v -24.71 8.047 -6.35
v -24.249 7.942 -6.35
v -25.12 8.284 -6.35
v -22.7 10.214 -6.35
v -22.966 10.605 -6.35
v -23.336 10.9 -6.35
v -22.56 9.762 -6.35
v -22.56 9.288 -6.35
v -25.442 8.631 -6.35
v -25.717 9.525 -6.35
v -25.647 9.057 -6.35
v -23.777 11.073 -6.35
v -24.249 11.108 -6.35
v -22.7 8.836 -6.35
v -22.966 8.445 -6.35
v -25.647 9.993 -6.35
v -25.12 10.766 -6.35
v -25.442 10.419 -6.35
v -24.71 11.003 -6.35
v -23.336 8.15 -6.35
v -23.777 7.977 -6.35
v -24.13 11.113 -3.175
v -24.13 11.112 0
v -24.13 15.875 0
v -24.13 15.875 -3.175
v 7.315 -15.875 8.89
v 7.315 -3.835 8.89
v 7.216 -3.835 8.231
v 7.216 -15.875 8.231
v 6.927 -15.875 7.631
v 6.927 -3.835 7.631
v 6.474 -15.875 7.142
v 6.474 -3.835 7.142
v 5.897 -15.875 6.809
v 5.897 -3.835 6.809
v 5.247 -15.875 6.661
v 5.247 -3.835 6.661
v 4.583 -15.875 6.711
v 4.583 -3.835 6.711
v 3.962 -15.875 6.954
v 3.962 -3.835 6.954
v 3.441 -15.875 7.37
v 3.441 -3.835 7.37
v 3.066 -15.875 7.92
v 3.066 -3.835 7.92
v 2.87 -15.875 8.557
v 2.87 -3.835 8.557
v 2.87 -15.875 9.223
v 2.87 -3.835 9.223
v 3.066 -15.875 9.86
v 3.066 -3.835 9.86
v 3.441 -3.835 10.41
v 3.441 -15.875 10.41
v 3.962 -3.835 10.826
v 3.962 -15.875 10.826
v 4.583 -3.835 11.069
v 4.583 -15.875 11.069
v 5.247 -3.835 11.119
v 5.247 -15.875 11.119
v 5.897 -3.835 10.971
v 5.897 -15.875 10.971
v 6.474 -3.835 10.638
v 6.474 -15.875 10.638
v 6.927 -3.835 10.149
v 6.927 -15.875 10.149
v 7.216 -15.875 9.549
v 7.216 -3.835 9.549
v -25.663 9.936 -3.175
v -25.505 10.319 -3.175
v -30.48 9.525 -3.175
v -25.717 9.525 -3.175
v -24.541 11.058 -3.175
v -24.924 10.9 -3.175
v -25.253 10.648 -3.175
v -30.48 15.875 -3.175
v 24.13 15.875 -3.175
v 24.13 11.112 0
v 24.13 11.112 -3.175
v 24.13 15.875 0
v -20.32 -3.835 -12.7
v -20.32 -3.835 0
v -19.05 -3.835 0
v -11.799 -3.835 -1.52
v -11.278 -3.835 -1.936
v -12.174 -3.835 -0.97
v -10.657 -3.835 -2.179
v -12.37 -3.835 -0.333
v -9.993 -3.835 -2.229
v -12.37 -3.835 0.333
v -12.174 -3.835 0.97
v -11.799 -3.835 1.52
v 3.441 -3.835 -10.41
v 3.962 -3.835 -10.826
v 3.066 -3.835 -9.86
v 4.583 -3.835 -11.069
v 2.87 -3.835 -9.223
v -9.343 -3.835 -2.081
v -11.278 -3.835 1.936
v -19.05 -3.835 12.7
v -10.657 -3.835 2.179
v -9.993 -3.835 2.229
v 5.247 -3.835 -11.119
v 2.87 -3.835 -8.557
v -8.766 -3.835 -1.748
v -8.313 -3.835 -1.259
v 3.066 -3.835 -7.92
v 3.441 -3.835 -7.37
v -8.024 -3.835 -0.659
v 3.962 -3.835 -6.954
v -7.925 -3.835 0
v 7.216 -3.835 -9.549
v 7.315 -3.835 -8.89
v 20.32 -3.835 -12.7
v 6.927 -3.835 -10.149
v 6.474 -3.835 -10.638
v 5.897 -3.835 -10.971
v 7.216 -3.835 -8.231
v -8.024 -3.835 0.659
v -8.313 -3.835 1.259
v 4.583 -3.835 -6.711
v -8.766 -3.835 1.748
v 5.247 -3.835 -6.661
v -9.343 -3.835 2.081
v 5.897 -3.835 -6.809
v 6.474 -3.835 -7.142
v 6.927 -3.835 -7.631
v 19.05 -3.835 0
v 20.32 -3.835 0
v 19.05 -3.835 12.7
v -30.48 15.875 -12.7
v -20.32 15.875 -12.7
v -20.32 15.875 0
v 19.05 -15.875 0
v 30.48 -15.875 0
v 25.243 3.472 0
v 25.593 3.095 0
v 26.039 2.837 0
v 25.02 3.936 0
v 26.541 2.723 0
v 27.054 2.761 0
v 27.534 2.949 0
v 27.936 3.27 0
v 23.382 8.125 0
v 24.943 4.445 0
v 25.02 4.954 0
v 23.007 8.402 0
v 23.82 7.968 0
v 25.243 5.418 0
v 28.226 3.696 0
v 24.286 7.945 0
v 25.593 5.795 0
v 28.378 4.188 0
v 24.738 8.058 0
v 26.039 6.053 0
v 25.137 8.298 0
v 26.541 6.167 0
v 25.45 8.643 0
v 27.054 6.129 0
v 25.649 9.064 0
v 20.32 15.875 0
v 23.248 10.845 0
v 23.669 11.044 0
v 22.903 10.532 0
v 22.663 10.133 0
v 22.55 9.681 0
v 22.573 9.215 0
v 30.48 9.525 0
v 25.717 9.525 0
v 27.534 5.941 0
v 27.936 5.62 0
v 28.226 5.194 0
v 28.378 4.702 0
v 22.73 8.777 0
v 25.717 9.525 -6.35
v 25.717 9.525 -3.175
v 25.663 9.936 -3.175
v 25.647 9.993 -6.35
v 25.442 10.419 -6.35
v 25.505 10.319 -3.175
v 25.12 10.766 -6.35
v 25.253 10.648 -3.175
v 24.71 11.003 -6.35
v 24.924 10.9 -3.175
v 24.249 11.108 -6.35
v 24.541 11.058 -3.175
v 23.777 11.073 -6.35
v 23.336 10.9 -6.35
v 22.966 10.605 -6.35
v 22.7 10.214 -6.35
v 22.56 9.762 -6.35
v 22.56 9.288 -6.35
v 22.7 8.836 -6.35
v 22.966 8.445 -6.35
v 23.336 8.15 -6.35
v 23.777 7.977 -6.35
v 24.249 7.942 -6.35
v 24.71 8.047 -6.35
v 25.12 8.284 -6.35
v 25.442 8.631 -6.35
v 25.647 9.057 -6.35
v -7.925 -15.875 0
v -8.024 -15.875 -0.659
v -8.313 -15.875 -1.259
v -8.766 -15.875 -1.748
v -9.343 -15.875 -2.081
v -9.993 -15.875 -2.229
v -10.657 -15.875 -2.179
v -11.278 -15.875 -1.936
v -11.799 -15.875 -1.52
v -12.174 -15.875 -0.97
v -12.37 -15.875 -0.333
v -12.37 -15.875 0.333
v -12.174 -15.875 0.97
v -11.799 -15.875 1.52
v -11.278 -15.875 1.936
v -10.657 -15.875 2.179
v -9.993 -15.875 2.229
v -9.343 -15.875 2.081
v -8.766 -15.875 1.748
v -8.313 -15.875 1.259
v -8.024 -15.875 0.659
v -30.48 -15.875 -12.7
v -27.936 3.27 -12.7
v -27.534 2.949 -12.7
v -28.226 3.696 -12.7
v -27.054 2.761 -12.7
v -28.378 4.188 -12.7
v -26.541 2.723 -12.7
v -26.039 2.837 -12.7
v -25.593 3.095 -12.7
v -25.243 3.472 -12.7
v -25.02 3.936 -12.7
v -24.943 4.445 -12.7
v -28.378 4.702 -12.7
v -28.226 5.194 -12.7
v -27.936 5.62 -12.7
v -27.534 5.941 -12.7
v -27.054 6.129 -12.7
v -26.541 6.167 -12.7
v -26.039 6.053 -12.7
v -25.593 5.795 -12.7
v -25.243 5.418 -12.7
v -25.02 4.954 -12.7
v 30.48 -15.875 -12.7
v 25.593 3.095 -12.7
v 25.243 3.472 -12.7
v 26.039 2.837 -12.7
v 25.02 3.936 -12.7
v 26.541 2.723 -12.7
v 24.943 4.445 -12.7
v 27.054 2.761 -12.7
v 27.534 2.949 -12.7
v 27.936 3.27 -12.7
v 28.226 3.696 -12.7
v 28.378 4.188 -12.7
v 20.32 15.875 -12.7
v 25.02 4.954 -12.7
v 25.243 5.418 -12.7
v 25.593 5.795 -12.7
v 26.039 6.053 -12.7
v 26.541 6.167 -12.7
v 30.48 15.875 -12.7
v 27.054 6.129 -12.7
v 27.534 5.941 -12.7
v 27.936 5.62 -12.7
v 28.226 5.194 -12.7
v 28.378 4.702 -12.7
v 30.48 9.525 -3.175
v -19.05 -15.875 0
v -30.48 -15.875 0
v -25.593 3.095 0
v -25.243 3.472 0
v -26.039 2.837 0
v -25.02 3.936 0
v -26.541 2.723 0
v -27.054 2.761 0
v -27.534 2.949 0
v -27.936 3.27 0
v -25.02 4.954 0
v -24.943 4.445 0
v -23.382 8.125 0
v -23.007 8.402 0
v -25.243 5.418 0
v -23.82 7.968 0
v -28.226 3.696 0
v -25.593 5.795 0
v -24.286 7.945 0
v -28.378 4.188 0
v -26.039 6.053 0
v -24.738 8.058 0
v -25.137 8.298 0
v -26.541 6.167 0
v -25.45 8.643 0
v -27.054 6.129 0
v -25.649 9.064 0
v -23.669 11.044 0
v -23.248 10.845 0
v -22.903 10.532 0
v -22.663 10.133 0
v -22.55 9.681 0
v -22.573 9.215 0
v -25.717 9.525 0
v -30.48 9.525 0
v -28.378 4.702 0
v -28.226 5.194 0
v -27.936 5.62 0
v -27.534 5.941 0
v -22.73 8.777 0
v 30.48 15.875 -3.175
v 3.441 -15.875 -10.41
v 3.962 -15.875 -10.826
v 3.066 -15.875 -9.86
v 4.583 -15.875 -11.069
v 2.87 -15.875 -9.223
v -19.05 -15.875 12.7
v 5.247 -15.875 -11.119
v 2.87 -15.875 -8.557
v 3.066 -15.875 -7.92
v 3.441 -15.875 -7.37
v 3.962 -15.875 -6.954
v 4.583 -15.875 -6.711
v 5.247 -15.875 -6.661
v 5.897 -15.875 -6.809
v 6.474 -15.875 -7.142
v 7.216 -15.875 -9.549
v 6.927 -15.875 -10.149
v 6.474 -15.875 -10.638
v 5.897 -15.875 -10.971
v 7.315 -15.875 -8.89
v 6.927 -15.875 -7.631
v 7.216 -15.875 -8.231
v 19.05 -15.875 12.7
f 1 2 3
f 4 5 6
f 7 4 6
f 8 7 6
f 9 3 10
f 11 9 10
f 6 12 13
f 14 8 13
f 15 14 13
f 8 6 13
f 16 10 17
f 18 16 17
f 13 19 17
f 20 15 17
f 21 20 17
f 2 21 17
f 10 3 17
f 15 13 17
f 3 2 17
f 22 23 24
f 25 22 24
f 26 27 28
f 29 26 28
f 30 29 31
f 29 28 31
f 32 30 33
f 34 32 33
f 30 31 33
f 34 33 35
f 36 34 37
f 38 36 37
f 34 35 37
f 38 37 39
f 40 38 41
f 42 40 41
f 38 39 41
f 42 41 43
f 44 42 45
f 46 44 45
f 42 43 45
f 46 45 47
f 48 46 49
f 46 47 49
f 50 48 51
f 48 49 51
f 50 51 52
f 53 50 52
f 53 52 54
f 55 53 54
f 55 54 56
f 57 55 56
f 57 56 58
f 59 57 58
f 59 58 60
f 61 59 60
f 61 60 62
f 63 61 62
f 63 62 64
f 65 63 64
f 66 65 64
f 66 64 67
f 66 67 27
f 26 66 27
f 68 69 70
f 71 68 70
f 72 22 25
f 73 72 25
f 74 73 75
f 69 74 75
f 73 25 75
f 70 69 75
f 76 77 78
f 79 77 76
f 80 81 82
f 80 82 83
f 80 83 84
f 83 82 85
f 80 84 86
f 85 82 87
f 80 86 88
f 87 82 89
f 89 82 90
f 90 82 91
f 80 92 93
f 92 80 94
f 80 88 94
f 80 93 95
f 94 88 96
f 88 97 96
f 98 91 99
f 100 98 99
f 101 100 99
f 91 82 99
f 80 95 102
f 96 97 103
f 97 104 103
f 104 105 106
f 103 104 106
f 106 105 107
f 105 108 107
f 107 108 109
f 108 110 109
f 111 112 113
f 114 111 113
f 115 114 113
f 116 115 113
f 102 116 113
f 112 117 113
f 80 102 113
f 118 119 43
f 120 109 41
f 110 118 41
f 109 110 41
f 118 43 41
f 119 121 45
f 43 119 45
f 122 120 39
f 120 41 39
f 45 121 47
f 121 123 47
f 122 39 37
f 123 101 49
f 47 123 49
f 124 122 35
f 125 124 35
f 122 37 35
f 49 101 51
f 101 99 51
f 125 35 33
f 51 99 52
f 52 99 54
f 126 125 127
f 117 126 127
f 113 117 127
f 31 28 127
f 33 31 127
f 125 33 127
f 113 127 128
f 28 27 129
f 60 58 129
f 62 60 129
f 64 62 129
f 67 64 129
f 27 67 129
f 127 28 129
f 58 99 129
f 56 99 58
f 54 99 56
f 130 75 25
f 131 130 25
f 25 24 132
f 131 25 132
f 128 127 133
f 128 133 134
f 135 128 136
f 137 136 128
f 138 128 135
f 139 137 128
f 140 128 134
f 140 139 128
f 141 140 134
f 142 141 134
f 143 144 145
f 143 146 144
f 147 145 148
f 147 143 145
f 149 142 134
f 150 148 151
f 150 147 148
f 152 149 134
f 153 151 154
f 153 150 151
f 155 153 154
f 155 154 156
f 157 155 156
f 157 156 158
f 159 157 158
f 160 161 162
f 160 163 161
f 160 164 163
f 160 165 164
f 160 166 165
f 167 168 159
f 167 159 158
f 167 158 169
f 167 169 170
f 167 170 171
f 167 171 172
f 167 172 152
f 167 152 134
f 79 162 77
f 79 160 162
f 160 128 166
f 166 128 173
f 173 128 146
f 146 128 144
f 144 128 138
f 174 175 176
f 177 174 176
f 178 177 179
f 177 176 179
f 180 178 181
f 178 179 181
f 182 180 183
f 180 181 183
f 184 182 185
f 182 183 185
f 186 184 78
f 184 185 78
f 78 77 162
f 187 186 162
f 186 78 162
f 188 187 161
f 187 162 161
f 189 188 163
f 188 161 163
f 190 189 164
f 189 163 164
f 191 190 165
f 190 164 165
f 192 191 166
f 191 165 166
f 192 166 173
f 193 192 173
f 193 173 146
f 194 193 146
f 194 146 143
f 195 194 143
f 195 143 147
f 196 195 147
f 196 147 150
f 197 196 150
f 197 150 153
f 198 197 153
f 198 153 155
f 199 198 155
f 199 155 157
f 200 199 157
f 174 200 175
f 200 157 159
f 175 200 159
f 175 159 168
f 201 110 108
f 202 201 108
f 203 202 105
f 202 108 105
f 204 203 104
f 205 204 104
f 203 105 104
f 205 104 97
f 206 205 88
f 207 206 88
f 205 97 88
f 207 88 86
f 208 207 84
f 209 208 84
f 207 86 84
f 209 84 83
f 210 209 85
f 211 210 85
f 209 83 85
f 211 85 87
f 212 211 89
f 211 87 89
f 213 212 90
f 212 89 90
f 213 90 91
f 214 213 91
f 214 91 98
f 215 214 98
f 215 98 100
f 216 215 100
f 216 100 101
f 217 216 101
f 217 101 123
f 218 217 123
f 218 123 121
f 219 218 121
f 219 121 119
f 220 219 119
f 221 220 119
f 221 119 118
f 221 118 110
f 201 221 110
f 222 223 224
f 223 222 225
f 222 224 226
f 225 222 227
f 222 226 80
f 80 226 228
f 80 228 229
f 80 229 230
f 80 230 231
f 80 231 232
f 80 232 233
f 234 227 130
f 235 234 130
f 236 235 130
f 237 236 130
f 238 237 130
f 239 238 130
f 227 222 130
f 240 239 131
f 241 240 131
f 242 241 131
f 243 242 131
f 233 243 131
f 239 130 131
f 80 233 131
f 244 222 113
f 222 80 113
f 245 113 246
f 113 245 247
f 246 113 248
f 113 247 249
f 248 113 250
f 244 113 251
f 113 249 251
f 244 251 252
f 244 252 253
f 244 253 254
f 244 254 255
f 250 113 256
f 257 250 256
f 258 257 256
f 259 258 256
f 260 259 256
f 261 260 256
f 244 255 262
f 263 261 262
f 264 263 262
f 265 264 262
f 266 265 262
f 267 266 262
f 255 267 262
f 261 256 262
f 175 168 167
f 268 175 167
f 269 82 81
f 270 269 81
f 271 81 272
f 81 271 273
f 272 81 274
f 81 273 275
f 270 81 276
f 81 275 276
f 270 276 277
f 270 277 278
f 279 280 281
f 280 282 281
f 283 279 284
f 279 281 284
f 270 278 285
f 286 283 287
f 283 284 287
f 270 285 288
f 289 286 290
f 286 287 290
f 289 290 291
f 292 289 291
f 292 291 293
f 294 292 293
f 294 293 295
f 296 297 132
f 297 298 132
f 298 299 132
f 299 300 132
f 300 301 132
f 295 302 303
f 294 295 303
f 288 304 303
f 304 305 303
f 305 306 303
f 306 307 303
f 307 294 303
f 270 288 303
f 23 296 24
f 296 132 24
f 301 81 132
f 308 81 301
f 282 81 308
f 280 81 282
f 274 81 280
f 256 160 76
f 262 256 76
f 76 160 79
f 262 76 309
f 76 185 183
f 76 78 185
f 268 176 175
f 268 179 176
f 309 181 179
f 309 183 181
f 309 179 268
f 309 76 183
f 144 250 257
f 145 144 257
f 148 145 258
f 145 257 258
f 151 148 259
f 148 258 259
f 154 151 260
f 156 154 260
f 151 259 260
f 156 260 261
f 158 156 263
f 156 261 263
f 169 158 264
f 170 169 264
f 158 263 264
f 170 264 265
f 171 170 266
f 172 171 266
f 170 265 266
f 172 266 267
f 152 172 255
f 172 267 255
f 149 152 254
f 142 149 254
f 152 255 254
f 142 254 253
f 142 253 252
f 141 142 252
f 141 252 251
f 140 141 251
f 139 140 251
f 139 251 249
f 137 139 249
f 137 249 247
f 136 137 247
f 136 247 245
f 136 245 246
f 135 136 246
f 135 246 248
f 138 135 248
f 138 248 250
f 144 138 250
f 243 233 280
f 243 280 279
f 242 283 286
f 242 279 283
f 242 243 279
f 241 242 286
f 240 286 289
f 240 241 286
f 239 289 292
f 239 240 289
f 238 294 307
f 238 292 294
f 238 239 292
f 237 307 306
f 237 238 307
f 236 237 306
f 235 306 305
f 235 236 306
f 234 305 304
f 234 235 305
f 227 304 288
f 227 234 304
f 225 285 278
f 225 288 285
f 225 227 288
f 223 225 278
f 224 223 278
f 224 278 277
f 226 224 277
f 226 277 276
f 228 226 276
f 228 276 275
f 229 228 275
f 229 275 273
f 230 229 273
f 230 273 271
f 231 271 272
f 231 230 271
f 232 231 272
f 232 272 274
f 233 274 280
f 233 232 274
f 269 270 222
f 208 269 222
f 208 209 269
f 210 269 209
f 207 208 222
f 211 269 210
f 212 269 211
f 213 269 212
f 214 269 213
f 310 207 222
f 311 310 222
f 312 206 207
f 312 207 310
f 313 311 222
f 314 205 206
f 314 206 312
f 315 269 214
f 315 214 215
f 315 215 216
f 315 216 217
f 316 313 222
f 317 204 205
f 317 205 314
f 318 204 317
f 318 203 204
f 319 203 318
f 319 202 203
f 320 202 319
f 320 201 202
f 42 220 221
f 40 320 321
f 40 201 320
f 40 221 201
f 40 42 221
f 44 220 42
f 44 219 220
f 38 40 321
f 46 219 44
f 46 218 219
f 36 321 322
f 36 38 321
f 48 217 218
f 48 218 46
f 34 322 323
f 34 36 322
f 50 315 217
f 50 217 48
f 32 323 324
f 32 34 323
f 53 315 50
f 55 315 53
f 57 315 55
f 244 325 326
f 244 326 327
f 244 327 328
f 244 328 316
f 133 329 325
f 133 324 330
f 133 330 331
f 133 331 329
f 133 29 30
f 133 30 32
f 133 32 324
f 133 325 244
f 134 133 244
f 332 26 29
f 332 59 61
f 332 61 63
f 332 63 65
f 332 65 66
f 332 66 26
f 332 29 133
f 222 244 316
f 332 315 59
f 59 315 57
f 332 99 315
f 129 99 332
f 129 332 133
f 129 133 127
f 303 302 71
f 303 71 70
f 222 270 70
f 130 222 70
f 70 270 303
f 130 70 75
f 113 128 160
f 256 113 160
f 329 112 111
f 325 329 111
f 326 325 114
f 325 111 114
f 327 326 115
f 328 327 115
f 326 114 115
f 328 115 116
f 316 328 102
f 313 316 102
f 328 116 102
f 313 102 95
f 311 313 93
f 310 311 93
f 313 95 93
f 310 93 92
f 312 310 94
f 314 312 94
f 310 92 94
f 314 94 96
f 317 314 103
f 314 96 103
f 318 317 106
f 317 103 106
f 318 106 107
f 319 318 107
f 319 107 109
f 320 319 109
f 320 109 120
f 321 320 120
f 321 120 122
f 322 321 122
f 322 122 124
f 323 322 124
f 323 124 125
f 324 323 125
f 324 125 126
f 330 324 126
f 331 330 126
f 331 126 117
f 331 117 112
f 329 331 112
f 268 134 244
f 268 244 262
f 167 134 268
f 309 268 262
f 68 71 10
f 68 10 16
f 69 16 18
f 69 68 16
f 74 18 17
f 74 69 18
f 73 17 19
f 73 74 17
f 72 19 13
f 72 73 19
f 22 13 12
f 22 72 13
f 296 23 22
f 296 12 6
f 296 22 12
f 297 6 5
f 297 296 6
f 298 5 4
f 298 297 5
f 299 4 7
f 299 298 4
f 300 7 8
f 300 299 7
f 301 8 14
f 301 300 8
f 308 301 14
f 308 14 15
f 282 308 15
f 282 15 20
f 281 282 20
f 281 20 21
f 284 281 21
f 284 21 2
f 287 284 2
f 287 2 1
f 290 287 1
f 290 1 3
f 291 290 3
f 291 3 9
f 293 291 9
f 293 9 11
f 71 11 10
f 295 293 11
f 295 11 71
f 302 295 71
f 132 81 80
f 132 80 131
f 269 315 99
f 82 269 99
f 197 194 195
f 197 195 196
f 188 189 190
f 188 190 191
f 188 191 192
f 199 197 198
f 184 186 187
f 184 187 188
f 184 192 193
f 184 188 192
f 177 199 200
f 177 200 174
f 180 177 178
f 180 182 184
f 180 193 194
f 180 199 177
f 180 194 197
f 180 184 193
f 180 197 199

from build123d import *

# Parameters (mm, degrees)
SKETCH1_W                 = 60.96
SKETCH1_H                 = 31.75
BOSS_EXTRUDE1_DEPTH       = 12.7
CUT_EXTRUDE2_REACH        = 27.4
SKETCH4_W                 = 40.64
SKETCH4_H                 = 19.7104
SKETCH5_W                 = 11.43
SKETCH5_H                 = 31.75
CUT_EXTRUDE3_DEPTH        = 12.7
SKETCH6_W                 = 6.35
SKETCH6_H                 = 6.35
CUT_EXTRUDE4_DEPTH        = 3.175
SKETCH7_R                 = 1.5875
CUT_EXTRUDE5_DEPTH        = 6.35
F_8_32_TAPPED_HOLE1_D     = 3.4544
F_8_32_TAPPED_HOLE1_DEPTH = 12.701
CUT_EXTRUDE6_REACH        = 14.04
SKETCH10_R                = 2.2352


with BuildPart() as part:
    # Sketch1 → Boss-Extrude1 (new body, symmetric)
    with BuildSketch(Plane.XY):
        Rectangle(SKETCH1_W, SKETCH1_H)
    extrude(amount=BOSS_EXTRUDE1_DEPTH, both=True)

    # Sketch4 → Cut-Extrude2 (cut, up to next)
    with BuildSketch(Plane.XY.offset(12.7), mode=Mode.PRIVATE) as cut_extrude2_sk1:
        with Locations((0, 6.0198)):
            Rectangle(SKETCH4_W, SKETCH4_H)
    cut_extrude2_tool1 = extrude(cut_extrude2_sk1.sketch, amount=-CUT_EXTRUDE2_REACH, mode=Mode.PRIVATE) & part.part
    add(cut_extrude2_tool1.solids().sort_by_distance((0, 6.0198, 12.7))[0], mode=Mode.SUBTRACT)

    # Sketch5 → Cut-Extrude3 (cut)
    with BuildSketch(Plane.XY.offset(12.7)):
        with Locations((24.765, 0)):
            Rectangle(SKETCH5_W, SKETCH5_H)
    cut_extrude3 = extrude(amount=-CUT_EXTRUDE3_DEPTH, mode=Mode.SUBTRACT)

    # Mirror2: Cut-Extrude3 across plane
    add(cut_extrude3.mirror(Plane(origin=(0, 0, 0), x_dir=(0, 0, 1), z_dir=(1, 0, 0))), mode=Mode.SUBTRACT)

    # Sketch6 → Cut-Extrude4 (cut)
    with BuildSketch(Plane.XY):
        with Locations((27.305, 12.7)):
            Rectangle(SKETCH6_W, SKETCH6_H)
    cut_extrude4 = extrude(amount=-CUT_EXTRUDE4_DEPTH, mode=Mode.SUBTRACT)

    # Sketch7 → Cut-Extrude5 (cut)
    with BuildSketch(Plane.XY):
        with Locations((24.13, 9.525)):
            Circle(SKETCH7_R)
    cut_extrude5 = extrude(amount=-CUT_EXTRUDE5_DEPTH, mode=Mode.SUBTRACT)

    # #8-32 Tapped Hole1
    with Locations(Plane.XY):
        with Locations((26.67, 4.445)):
            f_8_32_tapped_hole1 = Hole(F_8_32_TAPPED_HOLE1_D / 2, depth=F_8_32_TAPPED_HOLE1_DEPTH)

    # Sketch10 → Cut-Extrude6 (cut, up to next)
    with BuildSketch(Plane(origin=(0, -3.8354, 0), x_dir=(1, 0, 0), z_dir=(0, 1, 0)), mode=Mode.PRIVATE) as cut_extrude6_sk1:
        with Locations((5.08, 8.89)):
            Circle(SKETCH10_R)
    cut_extrude6_tool1 = extrude(cut_extrude6_sk1.sketch, amount=-CUT_EXTRUDE6_REACH, mode=Mode.PRIVATE) & part.part
    add(cut_extrude6_tool1.solids().sort_by_distance((5.08, -3.8354, -8.89))[0], mode=Mode.SUBTRACT)
    # Sketch10 → Cut-Extrude6 (cut, up to next)
    with BuildSketch(Plane(origin=(0, -3.8354, 0), x_dir=(1, 0, 0), z_dir=(0, 1, 0)), mode=Mode.PRIVATE) as cut_extrude6_sk2:
        with Locations((5.08, -8.89)):
            Circle(SKETCH10_R)
    cut_extrude6_tool2 = extrude(cut_extrude6_sk2.sketch, amount=-CUT_EXTRUDE6_REACH, mode=Mode.PRIVATE) & part.part
    add(cut_extrude6_tool2.solids().sort_by_distance((5.08, -3.8354, 8.89))[0], mode=Mode.SUBTRACT)
    # Sketch10 → Cut-Extrude6 (cut, up to next)
    with BuildSketch(Plane(origin=(0, -3.8354, 0), x_dir=(1, 0, 0), z_dir=(0, 1, 0)), mode=Mode.PRIVATE) as cut_extrude6_sk3:
        with Locations((-10.16, 0)):
            Circle(SKETCH10_R)
    cut_extrude6_tool3 = extrude(cut_extrude6_sk3.sketch, amount=-CUT_EXTRUDE6_REACH, mode=Mode.PRIVATE) & part.part
    add(cut_extrude6_tool3.solids().sort_by_distance((-10.16, -3.8354, 0))[0], mode=Mode.SUBTRACT)

    # Mirror3: Cut-Extrude4, Cut-Extrude5, #8-32 Tapped Hole1 across plane
    add(cut_extrude4.mirror(Plane(origin=(0, 0, 0), x_dir=(0, 0, 1), z_dir=(1, 0, 0))), mode=Mode.SUBTRACT)
    add(cut_extrude5.mirror(Plane(origin=(0, 0, 0), x_dir=(0, 0, 1), z_dir=(1, 0, 0))), mode=Mode.SUBTRACT)
    add(f_8_32_tapped_hole1.mirror(Plane(origin=(0, 0, 0), x_dir=(0, 0, 1), z_dir=(1, 0, 0))), mode=Mode.SUBTRACT)


solid = part.part
